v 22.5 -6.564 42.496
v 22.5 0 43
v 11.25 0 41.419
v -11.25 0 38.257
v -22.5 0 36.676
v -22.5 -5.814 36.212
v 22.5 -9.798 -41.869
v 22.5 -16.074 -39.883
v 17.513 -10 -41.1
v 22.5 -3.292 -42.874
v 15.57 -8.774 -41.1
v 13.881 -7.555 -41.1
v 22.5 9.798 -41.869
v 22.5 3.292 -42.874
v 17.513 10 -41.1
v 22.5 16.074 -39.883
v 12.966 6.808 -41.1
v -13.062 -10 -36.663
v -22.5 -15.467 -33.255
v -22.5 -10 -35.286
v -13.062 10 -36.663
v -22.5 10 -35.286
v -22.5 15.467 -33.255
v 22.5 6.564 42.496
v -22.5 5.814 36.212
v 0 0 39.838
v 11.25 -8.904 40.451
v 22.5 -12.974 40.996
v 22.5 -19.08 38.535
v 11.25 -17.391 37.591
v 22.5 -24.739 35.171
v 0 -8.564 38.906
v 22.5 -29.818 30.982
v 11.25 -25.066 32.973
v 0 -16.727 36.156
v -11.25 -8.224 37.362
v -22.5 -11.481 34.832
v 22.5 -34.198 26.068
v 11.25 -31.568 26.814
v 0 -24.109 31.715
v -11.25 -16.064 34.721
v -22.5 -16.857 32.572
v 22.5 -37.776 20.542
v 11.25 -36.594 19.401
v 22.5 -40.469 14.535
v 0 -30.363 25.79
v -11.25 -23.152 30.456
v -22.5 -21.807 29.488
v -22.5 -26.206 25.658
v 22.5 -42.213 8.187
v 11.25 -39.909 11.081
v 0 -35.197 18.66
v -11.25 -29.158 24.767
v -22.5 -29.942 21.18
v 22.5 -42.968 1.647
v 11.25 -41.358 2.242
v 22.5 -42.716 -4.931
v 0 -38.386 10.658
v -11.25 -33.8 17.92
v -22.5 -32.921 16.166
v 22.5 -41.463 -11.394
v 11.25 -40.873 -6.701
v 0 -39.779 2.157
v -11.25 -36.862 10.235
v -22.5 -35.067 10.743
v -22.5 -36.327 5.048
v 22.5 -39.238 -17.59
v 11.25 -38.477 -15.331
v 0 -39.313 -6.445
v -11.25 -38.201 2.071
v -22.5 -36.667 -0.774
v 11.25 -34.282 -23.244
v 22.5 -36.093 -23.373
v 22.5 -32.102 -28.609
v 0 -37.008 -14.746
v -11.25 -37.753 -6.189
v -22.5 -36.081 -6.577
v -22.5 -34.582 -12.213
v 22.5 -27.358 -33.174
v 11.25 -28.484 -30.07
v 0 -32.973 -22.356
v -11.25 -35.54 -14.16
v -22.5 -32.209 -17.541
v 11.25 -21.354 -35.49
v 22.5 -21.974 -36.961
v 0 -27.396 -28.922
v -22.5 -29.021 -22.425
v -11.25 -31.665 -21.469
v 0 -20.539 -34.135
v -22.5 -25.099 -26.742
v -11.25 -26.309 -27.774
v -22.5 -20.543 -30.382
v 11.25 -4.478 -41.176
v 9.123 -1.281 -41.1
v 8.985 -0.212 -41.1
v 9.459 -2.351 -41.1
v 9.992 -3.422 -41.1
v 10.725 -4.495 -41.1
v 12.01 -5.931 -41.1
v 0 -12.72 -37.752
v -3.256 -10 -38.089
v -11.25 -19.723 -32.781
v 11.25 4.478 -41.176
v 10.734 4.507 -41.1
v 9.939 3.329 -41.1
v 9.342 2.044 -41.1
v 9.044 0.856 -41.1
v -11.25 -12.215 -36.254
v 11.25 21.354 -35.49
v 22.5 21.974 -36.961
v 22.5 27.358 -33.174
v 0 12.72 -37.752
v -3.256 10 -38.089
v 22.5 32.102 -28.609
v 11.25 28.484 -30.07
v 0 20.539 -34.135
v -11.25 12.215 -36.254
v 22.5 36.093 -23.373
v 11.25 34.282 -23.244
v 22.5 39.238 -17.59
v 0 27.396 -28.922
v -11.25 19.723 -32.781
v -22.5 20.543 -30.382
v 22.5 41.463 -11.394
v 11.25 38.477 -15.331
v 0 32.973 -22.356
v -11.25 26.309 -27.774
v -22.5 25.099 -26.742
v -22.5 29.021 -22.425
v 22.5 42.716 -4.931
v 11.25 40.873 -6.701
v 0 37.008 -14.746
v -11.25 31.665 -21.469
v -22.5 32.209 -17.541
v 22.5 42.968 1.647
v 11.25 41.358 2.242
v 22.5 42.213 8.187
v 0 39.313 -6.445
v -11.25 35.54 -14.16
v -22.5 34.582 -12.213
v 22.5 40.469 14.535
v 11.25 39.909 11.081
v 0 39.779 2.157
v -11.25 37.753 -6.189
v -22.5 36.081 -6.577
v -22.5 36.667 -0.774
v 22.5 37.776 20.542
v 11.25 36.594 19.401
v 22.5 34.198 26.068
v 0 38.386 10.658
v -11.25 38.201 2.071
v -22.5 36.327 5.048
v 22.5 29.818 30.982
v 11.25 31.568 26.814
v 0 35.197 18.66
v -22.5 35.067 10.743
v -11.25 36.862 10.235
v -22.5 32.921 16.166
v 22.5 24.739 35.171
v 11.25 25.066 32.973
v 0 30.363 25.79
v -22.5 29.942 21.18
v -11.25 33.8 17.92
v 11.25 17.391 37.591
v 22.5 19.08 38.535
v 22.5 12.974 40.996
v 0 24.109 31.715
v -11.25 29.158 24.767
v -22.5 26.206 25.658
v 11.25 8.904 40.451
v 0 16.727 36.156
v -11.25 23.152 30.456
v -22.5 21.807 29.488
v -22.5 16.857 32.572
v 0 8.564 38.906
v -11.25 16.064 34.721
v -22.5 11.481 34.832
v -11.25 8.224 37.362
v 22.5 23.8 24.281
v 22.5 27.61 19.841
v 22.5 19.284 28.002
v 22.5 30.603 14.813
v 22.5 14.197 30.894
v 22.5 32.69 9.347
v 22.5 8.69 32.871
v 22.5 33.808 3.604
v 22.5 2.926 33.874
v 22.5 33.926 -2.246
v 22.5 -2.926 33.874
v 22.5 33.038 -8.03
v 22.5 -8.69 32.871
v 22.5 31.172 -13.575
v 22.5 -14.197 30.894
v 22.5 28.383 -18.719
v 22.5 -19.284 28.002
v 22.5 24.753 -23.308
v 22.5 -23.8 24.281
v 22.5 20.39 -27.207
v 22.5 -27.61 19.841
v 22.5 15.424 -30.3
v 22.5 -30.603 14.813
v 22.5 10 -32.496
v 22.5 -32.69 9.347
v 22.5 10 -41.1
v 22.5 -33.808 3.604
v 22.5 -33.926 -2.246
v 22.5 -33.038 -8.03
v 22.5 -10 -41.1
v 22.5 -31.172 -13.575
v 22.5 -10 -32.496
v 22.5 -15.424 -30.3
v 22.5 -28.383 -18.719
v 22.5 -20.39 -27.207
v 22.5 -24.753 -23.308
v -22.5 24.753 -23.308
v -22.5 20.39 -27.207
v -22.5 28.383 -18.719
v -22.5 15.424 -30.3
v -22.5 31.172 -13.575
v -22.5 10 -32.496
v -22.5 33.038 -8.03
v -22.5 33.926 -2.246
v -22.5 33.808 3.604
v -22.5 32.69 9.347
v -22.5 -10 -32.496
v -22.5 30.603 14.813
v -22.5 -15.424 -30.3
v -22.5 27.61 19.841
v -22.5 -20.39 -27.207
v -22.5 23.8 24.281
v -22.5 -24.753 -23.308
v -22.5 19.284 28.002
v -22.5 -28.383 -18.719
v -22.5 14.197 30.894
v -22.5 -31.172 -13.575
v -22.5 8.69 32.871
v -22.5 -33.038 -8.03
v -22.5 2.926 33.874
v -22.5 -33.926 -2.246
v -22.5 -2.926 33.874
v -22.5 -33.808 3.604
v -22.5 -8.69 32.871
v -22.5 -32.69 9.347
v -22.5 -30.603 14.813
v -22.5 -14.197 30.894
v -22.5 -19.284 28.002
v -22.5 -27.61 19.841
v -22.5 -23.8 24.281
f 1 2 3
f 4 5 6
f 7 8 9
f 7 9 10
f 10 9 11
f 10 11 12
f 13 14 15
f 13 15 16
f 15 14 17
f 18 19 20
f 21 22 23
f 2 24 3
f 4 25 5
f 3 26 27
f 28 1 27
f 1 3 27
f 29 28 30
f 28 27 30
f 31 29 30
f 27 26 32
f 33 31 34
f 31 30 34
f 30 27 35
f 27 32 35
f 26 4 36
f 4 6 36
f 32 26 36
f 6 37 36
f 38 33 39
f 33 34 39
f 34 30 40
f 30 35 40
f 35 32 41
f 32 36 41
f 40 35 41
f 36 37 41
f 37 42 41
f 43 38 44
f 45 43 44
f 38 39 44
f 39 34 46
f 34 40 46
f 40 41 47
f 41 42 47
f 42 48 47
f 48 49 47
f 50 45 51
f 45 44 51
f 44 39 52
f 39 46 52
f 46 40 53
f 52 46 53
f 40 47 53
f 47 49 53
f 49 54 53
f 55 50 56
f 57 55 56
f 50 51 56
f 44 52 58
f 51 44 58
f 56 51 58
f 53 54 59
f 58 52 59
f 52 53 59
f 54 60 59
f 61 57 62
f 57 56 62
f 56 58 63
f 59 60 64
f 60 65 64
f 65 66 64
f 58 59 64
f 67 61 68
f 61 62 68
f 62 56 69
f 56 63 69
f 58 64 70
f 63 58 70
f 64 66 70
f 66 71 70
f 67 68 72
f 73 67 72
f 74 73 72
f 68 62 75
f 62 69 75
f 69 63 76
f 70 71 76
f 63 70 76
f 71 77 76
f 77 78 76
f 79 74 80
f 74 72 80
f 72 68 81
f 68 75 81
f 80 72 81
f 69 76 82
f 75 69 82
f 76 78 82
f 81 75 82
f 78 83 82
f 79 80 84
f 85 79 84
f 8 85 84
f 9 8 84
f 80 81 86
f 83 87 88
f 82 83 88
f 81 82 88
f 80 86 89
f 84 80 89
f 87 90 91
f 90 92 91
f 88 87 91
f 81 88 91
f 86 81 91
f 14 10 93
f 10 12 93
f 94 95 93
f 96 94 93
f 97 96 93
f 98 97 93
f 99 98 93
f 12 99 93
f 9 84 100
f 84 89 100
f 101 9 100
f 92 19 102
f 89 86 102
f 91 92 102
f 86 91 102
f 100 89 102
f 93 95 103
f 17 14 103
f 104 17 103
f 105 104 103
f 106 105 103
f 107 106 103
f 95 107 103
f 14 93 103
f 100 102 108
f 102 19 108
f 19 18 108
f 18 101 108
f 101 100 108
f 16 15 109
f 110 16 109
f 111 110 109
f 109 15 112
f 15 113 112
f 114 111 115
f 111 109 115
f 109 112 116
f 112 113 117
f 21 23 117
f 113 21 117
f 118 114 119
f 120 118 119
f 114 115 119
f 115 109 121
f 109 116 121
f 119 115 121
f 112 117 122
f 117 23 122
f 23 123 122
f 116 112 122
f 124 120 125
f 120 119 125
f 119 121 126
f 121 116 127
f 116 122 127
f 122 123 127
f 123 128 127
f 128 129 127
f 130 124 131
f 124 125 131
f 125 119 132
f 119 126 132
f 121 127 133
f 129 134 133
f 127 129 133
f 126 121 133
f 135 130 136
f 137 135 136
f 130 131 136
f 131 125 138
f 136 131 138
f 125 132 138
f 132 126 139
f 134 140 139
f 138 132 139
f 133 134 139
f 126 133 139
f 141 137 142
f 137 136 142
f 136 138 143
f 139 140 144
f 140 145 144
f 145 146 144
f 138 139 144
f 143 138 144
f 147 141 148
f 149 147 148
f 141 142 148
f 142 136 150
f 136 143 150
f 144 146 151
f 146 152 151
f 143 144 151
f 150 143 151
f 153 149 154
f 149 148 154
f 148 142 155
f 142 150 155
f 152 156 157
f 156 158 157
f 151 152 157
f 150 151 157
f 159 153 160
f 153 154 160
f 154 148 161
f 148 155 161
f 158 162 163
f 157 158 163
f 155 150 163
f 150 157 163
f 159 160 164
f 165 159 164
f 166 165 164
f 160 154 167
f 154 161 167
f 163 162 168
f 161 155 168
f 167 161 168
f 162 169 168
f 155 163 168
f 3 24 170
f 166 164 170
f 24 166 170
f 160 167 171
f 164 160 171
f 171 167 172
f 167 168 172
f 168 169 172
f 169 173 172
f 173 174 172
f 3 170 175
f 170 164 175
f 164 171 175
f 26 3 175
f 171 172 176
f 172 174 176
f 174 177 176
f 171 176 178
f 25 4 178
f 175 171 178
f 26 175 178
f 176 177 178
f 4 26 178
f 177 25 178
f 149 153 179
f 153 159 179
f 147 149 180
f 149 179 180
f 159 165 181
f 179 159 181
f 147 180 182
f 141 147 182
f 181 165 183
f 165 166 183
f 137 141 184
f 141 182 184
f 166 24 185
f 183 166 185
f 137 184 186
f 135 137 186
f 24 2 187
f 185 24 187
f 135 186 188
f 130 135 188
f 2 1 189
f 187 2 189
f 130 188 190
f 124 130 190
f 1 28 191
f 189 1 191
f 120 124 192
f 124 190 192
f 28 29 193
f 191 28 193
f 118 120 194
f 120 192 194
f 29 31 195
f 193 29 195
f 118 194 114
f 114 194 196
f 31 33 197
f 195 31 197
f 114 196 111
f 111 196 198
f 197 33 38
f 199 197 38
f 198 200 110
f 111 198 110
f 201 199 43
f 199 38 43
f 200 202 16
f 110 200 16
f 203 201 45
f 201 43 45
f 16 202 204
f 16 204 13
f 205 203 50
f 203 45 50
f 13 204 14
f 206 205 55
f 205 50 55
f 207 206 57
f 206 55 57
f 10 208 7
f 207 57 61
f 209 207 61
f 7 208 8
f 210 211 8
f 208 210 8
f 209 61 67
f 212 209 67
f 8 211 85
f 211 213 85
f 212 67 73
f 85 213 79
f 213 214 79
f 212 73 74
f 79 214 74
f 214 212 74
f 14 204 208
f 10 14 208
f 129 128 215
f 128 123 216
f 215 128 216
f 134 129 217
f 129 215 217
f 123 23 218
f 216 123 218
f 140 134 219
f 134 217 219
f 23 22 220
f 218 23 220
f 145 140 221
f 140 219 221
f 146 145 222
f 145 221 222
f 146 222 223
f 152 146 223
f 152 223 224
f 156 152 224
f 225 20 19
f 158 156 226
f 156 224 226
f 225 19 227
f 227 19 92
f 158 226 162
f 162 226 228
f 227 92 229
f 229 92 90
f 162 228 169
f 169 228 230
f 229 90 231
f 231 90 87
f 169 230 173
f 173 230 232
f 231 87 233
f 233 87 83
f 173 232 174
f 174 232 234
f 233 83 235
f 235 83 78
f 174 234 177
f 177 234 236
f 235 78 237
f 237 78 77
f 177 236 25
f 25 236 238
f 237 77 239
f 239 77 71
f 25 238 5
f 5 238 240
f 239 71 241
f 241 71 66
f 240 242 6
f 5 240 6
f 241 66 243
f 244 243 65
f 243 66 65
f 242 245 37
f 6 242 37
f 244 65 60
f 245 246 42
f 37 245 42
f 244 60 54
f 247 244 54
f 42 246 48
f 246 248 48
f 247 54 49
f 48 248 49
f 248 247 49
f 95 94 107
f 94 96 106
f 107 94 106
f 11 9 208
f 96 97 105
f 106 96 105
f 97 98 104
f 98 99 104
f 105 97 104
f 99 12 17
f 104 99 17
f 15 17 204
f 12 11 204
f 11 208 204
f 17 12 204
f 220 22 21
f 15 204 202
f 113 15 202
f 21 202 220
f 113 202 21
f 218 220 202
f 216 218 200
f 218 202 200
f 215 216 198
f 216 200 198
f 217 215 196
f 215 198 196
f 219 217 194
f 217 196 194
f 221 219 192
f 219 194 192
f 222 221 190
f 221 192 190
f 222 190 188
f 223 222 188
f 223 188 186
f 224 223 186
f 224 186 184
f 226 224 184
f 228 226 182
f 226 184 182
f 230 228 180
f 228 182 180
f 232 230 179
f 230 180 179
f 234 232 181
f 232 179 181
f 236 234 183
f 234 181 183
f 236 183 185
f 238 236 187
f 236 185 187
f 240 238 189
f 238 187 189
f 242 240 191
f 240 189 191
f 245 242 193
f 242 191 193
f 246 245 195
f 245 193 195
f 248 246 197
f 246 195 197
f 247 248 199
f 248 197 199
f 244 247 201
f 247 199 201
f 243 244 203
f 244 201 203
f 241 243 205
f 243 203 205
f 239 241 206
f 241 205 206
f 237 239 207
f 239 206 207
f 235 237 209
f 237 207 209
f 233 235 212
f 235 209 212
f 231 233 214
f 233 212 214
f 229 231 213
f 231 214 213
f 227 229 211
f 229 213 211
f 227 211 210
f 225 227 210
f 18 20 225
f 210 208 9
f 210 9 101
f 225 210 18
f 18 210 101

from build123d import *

# Parameters (mm, degrees)
F2_W     = 20
F2_H     = 16.608118
F3_DEPTH = 45.001


with BuildPart() as f1:
    # F0 (on Front) → F1 (revolve)
    with BuildSketch(Plane.XZ):
        Polygon((-22.5, 36.675662), (-22.5, 34), (22.5, 34), (22.5, 43), align=None)
    revolve(axis=Axis((3.817478, 0, 0), (1, 0, 0)))

    # F2 (on face) → F3 (cut, through all)
    with BuildSketch(Plane.YZ.offset(22.5)):
        with Locations((0, -32.795941)):
            Rectangle(F2_W, F2_H)
    extrude(amount=-F3_DEPTH, mode=Mode.SUBTRACT)


solid = f1.part
